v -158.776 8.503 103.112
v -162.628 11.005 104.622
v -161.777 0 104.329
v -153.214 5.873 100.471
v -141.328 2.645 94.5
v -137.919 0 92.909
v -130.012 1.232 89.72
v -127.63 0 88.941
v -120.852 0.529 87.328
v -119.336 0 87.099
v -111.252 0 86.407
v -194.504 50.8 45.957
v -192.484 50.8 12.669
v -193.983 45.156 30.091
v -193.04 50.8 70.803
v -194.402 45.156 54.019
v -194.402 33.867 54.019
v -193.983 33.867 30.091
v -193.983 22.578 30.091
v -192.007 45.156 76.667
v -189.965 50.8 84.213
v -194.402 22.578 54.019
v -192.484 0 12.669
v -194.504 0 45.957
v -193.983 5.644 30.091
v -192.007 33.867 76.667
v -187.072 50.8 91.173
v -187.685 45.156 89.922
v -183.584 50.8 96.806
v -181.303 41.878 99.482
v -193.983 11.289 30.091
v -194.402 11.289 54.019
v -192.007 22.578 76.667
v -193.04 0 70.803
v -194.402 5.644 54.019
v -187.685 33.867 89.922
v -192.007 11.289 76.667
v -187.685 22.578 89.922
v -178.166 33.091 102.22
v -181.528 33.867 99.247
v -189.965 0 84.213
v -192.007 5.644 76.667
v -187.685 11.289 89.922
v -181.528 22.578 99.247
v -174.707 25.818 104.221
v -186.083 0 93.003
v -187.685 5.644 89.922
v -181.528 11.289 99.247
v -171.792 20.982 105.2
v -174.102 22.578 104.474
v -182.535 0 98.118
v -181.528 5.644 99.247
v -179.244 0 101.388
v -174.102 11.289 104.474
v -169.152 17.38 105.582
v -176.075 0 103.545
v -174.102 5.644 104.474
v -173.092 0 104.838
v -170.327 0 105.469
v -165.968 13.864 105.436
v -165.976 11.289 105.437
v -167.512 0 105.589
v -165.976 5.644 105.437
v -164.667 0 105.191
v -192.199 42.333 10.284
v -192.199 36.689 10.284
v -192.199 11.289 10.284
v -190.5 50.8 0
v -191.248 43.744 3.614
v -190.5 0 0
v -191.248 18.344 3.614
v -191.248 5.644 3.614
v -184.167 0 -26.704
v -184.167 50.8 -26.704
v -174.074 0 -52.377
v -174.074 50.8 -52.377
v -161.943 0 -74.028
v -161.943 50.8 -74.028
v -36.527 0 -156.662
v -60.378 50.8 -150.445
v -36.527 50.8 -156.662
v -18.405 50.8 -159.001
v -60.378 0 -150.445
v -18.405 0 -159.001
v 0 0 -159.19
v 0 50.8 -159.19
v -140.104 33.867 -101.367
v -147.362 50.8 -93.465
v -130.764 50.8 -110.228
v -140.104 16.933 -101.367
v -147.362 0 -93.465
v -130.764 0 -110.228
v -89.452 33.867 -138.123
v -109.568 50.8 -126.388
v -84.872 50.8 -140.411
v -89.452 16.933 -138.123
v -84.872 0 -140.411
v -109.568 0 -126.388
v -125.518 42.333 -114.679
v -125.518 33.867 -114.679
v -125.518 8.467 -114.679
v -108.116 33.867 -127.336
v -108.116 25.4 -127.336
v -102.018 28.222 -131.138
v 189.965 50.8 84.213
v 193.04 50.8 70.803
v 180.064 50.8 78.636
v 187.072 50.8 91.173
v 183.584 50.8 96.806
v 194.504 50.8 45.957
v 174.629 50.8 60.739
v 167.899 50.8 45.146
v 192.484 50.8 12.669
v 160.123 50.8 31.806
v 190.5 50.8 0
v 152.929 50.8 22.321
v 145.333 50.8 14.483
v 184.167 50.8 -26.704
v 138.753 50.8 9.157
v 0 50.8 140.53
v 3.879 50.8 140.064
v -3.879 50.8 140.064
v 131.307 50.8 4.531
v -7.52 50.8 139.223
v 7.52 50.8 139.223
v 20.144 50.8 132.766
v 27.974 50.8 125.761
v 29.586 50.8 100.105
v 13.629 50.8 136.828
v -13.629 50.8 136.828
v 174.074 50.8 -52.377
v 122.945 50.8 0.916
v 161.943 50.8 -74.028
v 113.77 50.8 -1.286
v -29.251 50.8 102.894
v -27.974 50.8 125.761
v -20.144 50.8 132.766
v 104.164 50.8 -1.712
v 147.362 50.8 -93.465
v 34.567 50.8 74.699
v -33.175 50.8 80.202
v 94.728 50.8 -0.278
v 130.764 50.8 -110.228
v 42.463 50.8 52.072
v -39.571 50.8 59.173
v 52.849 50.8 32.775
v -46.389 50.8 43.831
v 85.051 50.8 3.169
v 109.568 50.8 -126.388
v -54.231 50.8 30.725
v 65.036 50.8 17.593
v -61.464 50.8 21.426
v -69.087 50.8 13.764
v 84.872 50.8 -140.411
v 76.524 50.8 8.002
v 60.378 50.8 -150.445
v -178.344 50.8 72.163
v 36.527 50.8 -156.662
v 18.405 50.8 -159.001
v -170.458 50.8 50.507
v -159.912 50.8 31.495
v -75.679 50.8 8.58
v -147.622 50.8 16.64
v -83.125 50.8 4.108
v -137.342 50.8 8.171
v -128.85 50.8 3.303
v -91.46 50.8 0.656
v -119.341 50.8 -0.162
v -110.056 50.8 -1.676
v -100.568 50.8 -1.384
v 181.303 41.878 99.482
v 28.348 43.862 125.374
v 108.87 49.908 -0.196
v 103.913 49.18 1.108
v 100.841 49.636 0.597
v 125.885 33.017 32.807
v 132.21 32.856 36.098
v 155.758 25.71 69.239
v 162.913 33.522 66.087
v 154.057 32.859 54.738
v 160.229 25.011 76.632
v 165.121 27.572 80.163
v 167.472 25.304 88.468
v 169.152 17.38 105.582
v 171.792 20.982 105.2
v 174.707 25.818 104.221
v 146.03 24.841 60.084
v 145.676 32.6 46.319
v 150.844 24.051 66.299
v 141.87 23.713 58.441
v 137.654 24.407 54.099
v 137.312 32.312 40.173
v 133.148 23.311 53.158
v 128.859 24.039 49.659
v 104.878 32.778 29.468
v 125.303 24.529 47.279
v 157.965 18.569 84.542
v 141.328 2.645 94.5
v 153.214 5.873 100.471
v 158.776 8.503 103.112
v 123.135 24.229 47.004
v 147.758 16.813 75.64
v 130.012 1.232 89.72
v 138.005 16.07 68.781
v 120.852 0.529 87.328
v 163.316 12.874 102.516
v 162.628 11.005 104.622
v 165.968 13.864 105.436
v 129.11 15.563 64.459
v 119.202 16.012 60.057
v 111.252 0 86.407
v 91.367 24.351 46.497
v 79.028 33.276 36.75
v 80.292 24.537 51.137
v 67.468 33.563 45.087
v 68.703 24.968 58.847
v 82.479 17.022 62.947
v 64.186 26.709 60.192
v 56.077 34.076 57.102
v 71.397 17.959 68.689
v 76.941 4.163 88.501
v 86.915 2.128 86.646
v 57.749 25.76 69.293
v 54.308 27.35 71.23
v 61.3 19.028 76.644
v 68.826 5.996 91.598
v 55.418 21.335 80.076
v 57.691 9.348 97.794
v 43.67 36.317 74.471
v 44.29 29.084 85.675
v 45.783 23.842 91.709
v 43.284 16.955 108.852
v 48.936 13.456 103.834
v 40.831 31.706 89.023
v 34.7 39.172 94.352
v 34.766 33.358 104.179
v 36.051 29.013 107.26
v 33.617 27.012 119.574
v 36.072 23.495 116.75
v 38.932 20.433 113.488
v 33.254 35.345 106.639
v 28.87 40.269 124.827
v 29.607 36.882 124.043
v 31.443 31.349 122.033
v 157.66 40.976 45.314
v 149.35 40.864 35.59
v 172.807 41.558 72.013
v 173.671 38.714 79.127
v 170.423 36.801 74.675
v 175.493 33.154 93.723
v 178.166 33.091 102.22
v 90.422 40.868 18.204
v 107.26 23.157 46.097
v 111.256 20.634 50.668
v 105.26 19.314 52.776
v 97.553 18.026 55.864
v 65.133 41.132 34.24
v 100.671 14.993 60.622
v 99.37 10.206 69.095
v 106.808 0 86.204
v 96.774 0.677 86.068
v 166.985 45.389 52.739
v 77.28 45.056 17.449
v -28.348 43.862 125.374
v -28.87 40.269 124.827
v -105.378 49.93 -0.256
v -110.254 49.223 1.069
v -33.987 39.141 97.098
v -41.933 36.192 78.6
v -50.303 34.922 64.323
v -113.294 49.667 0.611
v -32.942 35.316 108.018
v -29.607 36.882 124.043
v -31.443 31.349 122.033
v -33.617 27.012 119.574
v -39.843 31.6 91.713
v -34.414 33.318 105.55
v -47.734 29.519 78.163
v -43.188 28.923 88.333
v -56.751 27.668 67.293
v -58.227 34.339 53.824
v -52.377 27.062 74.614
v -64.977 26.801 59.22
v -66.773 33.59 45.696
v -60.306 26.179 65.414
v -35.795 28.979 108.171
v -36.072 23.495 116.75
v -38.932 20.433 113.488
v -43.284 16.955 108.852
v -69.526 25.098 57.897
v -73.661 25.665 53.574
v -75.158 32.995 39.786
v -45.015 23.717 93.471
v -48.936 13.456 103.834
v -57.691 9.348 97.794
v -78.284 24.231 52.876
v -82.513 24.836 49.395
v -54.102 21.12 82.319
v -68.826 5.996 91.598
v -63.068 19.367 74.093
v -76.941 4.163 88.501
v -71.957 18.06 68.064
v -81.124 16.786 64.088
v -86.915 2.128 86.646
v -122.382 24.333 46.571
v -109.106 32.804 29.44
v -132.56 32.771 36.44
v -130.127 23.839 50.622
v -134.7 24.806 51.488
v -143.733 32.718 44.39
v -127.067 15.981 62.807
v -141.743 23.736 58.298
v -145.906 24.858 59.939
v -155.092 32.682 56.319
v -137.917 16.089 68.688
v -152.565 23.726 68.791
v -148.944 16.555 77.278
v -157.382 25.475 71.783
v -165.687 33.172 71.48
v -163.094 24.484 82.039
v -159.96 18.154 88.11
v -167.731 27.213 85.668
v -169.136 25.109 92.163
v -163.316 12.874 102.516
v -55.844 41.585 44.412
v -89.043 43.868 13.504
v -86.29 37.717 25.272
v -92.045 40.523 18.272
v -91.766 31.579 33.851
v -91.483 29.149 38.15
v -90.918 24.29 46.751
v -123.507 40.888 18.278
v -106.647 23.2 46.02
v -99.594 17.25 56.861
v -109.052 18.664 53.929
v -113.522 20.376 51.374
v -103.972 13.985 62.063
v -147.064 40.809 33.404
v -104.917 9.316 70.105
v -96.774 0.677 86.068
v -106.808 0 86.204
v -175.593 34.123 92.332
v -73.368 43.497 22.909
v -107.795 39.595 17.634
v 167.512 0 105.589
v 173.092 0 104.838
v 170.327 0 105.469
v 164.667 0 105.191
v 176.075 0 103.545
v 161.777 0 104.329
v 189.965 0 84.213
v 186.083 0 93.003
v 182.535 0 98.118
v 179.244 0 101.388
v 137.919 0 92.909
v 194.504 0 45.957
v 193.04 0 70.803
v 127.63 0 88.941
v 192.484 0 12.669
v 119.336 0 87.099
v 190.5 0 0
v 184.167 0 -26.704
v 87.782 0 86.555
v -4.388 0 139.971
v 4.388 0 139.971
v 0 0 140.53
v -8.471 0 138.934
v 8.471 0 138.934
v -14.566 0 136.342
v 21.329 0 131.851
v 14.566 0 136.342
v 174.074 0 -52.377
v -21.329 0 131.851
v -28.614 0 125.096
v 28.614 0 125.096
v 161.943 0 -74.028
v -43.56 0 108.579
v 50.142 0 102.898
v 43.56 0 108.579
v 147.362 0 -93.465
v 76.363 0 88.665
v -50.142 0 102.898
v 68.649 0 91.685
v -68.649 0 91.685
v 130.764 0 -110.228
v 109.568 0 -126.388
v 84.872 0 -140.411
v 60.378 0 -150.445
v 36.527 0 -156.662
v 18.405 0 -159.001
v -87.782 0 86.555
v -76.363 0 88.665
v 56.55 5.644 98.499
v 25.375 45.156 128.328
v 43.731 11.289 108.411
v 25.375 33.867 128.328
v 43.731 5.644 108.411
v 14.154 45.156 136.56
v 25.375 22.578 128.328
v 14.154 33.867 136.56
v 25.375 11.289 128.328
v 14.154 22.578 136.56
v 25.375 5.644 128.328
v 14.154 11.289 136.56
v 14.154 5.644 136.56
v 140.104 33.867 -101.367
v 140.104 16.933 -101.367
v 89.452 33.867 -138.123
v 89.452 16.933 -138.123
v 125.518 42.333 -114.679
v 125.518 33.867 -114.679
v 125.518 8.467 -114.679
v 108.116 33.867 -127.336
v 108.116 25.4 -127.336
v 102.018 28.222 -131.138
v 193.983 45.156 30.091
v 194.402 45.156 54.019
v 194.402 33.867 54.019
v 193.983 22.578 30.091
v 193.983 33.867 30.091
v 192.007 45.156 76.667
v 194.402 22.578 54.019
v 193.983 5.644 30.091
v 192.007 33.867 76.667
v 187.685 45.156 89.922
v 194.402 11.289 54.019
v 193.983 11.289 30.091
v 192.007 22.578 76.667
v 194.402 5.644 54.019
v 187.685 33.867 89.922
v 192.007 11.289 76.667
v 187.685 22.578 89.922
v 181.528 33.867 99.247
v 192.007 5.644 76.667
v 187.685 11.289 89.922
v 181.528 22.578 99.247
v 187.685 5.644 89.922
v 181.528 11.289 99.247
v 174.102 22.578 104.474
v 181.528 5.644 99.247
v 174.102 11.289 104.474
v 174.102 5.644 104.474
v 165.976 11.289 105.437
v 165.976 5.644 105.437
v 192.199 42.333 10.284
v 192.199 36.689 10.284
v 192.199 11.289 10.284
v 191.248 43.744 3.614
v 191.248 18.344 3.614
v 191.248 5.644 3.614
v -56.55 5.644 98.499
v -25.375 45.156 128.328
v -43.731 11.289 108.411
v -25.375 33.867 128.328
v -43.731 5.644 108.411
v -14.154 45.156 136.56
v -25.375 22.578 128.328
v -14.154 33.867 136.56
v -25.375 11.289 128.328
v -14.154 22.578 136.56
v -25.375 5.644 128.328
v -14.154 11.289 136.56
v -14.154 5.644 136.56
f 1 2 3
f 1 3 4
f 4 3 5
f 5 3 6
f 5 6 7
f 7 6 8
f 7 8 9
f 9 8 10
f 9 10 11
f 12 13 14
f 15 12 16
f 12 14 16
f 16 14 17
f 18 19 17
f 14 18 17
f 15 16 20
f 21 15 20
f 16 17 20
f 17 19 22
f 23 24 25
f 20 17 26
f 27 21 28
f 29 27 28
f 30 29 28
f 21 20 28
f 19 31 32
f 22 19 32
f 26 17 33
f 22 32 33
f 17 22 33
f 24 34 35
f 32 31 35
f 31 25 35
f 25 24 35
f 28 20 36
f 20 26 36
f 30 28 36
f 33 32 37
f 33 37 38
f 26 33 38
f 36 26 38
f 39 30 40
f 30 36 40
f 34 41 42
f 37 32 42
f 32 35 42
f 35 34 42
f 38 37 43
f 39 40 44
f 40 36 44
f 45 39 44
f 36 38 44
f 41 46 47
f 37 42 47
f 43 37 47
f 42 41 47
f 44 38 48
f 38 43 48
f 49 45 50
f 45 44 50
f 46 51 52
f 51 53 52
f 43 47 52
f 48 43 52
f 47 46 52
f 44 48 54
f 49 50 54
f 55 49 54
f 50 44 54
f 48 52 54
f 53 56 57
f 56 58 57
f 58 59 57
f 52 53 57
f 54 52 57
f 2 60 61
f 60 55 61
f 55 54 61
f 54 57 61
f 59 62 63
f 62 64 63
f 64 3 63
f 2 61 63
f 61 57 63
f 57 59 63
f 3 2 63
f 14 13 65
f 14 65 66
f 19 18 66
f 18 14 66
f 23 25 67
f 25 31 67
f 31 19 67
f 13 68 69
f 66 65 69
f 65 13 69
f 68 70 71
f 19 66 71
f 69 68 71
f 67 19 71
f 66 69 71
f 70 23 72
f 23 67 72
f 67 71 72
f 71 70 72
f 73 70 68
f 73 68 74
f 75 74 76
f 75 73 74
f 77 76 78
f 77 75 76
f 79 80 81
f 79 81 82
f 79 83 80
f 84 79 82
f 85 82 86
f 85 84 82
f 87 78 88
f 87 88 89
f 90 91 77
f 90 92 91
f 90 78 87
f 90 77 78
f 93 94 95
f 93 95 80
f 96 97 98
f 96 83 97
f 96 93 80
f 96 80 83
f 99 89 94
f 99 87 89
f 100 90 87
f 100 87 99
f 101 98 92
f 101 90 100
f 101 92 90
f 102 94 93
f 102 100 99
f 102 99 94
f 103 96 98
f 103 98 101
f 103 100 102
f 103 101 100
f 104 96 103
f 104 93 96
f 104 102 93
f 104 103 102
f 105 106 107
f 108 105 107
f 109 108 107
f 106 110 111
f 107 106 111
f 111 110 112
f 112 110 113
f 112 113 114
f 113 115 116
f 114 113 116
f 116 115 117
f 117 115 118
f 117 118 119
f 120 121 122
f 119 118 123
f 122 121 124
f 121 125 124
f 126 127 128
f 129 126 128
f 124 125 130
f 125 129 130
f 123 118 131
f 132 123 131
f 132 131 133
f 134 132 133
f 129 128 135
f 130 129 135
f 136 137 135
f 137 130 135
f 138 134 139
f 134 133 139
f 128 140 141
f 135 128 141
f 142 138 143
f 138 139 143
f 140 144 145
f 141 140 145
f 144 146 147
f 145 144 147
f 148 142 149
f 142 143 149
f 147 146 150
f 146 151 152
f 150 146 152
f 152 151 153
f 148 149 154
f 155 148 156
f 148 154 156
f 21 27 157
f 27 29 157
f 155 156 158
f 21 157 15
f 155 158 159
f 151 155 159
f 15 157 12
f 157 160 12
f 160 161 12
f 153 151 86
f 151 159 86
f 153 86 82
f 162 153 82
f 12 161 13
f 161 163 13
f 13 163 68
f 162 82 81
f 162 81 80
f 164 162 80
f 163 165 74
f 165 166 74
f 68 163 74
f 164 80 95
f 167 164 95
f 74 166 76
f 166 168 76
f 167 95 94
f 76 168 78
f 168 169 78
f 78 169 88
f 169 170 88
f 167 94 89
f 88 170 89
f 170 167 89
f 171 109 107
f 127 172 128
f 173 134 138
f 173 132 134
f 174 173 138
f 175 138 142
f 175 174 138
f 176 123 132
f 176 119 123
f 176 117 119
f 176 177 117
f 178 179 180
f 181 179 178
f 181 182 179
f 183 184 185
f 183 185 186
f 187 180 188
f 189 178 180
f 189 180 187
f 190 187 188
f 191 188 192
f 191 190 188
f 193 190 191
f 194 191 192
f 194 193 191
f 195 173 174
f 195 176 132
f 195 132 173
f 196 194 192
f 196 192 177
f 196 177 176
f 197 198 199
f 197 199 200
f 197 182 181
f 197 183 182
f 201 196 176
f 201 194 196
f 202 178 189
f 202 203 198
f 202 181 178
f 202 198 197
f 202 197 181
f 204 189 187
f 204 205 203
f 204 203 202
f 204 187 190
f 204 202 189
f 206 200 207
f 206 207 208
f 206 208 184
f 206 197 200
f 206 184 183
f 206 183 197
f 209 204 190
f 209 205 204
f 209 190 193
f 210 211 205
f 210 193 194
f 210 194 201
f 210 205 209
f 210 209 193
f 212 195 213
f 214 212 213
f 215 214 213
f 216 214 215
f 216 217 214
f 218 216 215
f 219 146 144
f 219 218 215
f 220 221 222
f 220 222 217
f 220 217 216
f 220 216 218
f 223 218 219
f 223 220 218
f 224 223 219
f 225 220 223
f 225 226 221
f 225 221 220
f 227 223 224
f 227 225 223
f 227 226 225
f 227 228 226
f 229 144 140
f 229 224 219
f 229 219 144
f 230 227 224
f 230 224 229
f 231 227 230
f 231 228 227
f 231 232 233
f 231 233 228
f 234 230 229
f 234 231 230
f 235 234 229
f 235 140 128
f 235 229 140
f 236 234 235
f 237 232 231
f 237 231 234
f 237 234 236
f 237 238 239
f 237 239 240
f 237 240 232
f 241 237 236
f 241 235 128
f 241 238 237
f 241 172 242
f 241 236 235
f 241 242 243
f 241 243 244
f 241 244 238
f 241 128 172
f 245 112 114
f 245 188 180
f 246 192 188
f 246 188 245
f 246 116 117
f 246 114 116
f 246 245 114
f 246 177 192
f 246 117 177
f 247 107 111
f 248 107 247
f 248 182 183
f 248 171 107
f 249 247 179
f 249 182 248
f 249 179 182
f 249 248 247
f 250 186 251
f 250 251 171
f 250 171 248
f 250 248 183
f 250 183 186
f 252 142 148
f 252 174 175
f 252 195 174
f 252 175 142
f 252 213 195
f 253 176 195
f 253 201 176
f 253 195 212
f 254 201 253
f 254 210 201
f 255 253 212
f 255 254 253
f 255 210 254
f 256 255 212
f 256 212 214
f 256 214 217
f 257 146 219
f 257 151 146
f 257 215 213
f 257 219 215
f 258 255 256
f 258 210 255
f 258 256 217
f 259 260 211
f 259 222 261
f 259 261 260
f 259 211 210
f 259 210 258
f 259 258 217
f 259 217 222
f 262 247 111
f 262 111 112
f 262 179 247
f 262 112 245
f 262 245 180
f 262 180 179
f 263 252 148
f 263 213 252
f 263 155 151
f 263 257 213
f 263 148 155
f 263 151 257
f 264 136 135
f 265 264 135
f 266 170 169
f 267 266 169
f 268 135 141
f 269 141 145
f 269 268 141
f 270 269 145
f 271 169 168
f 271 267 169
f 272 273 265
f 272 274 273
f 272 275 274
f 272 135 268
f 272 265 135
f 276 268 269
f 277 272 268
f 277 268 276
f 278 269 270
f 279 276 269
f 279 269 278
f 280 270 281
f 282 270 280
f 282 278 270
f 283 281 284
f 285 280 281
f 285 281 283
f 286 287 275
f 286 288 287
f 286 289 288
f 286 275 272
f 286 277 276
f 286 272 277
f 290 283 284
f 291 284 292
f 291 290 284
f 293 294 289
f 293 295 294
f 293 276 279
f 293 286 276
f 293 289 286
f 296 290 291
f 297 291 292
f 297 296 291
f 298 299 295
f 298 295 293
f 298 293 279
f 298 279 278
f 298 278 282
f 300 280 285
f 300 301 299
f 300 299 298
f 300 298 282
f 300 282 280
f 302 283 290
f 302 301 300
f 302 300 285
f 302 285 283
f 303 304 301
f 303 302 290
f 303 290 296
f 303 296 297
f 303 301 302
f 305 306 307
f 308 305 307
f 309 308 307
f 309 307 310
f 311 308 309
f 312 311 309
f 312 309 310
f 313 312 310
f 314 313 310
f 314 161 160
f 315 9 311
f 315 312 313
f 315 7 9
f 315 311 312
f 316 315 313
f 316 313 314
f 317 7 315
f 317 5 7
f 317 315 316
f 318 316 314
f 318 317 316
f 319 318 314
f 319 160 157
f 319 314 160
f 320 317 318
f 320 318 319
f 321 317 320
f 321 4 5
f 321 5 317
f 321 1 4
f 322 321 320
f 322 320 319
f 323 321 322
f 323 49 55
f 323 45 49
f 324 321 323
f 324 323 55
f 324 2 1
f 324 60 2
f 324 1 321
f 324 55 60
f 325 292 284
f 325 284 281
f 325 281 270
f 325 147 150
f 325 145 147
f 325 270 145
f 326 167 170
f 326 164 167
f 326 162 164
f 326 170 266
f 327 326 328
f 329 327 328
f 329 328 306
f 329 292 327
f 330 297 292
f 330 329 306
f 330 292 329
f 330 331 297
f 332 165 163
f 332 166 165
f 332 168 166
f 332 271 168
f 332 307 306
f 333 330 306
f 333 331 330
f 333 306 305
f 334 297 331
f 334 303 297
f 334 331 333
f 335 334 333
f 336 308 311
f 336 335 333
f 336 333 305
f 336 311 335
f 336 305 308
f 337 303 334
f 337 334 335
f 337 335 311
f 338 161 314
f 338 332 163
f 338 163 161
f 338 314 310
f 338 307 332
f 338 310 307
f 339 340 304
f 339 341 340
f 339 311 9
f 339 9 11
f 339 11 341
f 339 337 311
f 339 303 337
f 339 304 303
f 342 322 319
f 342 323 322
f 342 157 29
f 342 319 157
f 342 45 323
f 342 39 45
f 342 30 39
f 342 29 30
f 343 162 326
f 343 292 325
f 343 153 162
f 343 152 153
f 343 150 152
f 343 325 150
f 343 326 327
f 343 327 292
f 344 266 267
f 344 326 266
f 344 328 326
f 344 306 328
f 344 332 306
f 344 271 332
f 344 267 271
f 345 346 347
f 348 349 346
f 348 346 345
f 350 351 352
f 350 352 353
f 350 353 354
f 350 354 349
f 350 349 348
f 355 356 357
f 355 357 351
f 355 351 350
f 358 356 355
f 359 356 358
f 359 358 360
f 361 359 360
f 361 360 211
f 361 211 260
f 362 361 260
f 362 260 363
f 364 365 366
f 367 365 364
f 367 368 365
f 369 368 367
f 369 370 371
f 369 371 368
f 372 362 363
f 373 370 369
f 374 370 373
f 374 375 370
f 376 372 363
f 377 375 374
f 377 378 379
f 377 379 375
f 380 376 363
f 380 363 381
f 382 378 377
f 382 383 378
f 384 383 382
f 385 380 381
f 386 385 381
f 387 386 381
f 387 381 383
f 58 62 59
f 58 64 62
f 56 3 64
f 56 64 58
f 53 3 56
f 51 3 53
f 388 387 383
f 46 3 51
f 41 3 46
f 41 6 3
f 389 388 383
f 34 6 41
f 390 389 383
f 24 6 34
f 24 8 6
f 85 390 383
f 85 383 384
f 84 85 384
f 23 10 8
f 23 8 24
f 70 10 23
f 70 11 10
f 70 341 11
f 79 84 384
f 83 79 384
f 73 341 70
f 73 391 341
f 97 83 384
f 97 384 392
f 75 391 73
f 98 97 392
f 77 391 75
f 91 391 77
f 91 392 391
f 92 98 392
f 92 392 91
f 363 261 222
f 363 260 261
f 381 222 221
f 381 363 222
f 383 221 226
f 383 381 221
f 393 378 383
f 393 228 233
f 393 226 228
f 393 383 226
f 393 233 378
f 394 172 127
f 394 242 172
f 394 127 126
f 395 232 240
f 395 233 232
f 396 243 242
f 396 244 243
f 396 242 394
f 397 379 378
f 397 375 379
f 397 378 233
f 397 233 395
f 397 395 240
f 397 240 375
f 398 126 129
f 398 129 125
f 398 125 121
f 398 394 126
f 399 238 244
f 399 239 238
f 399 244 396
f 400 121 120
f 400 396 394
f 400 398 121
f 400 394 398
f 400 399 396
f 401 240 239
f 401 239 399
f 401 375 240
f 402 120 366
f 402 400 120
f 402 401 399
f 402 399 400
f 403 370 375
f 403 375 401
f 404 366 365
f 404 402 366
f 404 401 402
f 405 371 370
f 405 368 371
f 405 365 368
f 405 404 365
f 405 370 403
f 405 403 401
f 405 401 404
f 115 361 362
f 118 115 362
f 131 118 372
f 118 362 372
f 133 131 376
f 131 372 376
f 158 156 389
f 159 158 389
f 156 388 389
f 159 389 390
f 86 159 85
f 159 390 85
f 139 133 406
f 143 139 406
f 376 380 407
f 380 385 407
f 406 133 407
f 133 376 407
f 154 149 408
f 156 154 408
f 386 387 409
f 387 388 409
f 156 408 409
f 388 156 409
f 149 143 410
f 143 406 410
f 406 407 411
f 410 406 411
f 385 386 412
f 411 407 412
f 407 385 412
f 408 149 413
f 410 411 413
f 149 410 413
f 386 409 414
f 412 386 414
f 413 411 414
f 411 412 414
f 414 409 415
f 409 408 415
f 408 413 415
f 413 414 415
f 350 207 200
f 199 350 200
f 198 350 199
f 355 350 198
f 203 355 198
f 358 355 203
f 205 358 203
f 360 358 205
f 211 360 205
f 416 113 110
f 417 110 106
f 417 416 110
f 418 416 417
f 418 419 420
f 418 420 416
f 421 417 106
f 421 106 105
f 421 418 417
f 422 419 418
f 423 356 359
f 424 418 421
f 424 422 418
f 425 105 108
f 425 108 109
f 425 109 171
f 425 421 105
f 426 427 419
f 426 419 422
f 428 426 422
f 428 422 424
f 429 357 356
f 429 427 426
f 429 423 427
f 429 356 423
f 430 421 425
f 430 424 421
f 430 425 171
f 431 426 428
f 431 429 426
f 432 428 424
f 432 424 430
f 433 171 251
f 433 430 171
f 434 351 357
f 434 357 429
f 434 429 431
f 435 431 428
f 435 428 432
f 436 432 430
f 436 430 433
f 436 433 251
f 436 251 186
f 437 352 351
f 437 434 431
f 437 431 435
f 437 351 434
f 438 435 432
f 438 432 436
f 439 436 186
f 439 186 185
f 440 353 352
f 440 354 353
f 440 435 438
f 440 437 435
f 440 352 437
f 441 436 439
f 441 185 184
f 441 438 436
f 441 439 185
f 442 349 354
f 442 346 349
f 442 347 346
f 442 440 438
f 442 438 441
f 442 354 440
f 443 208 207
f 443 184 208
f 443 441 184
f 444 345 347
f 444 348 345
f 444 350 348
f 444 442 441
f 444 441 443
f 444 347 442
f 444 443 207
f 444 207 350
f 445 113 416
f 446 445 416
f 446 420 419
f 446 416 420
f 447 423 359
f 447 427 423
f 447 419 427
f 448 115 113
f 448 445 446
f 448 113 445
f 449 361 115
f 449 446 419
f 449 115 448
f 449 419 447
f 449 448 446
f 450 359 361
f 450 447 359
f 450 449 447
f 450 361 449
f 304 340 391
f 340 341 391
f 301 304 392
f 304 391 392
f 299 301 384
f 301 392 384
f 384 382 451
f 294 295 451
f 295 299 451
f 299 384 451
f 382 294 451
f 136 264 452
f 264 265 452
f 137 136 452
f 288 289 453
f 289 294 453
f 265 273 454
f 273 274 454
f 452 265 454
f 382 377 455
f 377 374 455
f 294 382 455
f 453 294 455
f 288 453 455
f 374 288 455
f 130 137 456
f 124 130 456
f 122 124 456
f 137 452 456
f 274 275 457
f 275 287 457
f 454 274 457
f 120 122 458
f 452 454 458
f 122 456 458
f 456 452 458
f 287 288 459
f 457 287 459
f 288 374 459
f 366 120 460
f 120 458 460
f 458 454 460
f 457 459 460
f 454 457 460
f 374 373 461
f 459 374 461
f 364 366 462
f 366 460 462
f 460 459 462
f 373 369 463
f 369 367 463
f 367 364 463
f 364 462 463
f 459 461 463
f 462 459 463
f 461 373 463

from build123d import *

# Parameters (mm, degrees)
BOSS_EXTRUDE1_DEPTH     = 50.8
CUT_EXTRUDE1_DEPTH      = 260.287236955
CUT_EXTRUDE1_DEPTH_BACK = 260.287236955
SKETCH6_RX              = 78.834045808
SKETCH6_RY              = 63.772521642


with BuildPart() as part:
    # Sketch3 → Boss-Extrude1 (new body)
    with BuildSketch(Plane(origin=(0, 0, 0), x_dir=(1, 0, 0), z_dir=(0, 1, 0))):
        with BuildLine():
            add(Edge.make_bspline(
                [(-190.5, 0), (-184.392726562, 37.537038237), (-157.261289847, 93.964093485), (-82.387478202, 146.622658841), (-31.311374143, 160.799884185), (0, 159.189909928)],
                knots=[0, 0, 0, 0, 0.424401366, 0.656369581, 1, 1, 1, 1], degree=3))
            add(Edge.make_bspline(
                [(190.5, 0), (184.392726562, 37.537038237), (157.261289847, 93.964093485), (82.387478202, 146.622658841), (31.311374143, 160.799884185), (0, 159.189909928)],
                knots=[0, 0, 0, 0, 0.424401366, 0.656369581, 1, 1, 1, 1], degree=3))
            add(Edge.make_bspline(
                [(190.5, 0), (192.064011793, -4.963501926), (201.967167766, -83.314618311), (174.696602041, -109.289958804), (151.630121659, -100.567984898), (131.410771519, -87.719783961), (96.843567628, -85.375403377), (78.692510144, -86.25882742), (58.833533072, -96.87938247), (37.30593461, -109.935798162), (21.349613946, -139.114767457), (0, -140.530090072)],
                knots=[0, 0, 0, 0, 0.166997052, 0.292320514, 0.319633117, 0.42673531, 0.45891405, 0.609241775, 0.641909704, 0.76680237, 1, 1, 1, 1], degree=3))
            add(Edge.make_bspline(
                [(-190.5, 0), (-192.064011793, -4.963501926), (-201.967167766, -83.314618311), (-174.696602041, -109.289958804), (-151.630121659, -100.567984898), (-131.410771519, -87.719783961), (-96.843567628, -85.375403377), (-78.692510144, -86.25882742), (-58.833533072, -96.87938247), (-37.30593461, -109.935798162), (-21.349613946, -139.114767457), (0, -140.530090072)],
                knots=[0, 0, 0, 0, 0.166997052, 0.292320514, 0.319633117, 0.42673531, 0.45891405, 0.609241775, 0.641909704, 0.76680237, 1, 1, 1, 1], degree=3))
        make_face()
    extrude(amount=BOSS_EXTRUDE1_DEPTH)

    # Sketch6 → Cut-Extrude1 (cut, two sides: drawn at the far end of the back side and taken through both)
    with BuildSketch(Plane(origin=(0, 24.086508497, 9.976958489), x_dir=(-1, 0, 0), z_dir=(0, 0.5000000000000041, -0.8660254037844364)).offset(-CUT_EXTRUDE1_DEPTH_BACK)):
        with Locations(Location((-106.808169671, 81.026464977), (0, 0, -180))):
            Ellipse(SKETCH6_RX, SKETCH6_RY)
        with Locations(Location((106.808169671, 81.026464977), (0, 0, 180))):
            Ellipse(SKETCH6_RX, SKETCH6_RY)
    extrude(amount=CUT_EXTRUDE1_DEPTH + CUT_EXTRUDE1_DEPTH_BACK, mode=Mode.SUBTRACT)


solid = part.part
